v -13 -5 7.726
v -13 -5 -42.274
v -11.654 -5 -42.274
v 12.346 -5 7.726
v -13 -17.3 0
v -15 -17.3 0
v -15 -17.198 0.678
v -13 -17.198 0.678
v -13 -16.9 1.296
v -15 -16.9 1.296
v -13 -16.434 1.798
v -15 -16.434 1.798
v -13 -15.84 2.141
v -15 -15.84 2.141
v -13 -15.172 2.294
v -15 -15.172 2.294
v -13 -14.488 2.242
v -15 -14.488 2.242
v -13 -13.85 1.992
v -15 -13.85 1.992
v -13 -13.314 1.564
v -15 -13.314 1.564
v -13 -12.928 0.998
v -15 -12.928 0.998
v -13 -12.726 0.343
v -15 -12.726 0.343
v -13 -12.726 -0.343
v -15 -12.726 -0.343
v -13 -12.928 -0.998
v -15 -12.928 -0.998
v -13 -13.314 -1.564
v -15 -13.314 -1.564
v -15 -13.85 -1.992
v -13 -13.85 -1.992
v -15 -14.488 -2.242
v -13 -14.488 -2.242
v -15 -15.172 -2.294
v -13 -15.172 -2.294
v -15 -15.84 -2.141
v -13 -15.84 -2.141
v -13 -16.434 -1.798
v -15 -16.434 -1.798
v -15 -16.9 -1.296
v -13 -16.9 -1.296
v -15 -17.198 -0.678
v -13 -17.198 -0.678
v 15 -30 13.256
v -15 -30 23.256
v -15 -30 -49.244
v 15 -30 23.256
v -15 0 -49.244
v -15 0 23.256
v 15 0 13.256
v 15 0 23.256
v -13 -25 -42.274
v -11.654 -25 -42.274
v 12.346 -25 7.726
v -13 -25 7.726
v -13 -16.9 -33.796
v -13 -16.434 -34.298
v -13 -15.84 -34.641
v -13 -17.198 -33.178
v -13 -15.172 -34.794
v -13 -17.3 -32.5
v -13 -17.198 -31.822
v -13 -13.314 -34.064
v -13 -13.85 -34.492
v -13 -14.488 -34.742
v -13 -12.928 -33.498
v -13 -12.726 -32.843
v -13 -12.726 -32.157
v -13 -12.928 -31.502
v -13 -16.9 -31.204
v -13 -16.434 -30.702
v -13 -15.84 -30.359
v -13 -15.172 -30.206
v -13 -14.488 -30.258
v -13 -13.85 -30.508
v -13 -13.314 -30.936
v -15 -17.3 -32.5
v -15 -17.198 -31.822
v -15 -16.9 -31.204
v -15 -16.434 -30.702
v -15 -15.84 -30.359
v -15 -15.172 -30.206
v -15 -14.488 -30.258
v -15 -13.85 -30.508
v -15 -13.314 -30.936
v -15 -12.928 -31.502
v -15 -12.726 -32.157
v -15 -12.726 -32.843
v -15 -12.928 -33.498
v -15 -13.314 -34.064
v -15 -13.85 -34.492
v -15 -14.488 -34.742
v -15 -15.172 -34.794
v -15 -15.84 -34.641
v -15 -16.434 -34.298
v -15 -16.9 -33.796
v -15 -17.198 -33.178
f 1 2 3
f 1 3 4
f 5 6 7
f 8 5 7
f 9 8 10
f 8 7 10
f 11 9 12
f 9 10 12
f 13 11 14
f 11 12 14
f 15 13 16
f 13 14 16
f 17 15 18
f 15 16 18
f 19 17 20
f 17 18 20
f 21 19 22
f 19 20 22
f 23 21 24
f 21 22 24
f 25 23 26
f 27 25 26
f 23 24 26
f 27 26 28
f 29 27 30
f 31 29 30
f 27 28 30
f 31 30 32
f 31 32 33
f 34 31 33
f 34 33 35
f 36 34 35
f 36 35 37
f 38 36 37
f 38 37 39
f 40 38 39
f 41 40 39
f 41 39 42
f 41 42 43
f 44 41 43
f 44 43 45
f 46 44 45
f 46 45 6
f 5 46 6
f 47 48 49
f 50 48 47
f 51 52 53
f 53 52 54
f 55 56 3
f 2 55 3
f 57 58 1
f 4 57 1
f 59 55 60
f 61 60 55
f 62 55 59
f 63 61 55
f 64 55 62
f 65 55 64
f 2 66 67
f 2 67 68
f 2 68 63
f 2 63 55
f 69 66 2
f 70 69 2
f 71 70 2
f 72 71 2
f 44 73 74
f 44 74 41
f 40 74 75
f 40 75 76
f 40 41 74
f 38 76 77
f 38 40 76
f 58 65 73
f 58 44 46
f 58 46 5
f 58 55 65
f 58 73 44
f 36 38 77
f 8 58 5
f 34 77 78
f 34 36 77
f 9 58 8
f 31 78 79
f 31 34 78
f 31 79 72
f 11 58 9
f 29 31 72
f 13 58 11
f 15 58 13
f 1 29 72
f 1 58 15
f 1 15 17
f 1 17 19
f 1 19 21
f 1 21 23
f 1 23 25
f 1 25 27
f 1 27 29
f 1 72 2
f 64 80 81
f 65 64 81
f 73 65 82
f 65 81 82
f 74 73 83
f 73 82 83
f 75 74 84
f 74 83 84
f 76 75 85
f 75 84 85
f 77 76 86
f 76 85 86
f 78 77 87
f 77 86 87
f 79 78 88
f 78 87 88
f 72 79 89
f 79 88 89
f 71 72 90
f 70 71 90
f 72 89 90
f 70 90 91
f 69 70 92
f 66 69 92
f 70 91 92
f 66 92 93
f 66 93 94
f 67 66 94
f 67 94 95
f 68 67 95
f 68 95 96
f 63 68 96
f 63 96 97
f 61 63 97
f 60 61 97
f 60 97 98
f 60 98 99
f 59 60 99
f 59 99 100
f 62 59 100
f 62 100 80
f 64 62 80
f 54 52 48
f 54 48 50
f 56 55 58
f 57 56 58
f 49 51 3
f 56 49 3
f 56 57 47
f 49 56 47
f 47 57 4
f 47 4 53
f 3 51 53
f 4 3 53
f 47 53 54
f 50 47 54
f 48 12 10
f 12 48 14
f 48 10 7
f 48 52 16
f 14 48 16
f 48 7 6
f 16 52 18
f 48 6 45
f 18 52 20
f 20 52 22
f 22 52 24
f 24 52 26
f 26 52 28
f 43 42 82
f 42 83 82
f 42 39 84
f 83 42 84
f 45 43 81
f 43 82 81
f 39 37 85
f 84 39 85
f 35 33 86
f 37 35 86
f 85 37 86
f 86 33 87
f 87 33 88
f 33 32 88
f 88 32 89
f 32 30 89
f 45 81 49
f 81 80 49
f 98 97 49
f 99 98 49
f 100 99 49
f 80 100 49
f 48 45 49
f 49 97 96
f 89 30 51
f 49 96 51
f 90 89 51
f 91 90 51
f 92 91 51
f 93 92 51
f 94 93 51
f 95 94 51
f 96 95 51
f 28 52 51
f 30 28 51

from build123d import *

# Parameters (mm, degrees)
F0_W          = 30
F0_H          = 10
F1_DEPTH      = 30
F2_R          = 2.3
F3_DEPTH      = 30.001
F4_W          = 20
F4_H          = 50
F5_DEPTH      = 13
F5_DEPTH_BACK = 15.001


with BuildPart() as f1:
    # F0 (on Front) → F1 (new body)
    with BuildSketch(Plane.XZ):
        with Locations((0, 18.2561938465)):
            Rectangle(F0_W, F0_H)
        Polygon((15, 13.2561938465), (-15, 13.2561938465), (-15, -49.2438061535), align=None)
    extrude(amount=F1_DEPTH)

    # F2 (on face) → F3 (cut, through all)
    with BuildSketch(Plane(origin=(-15, 0, 0), x_dir=(0, -1, 0), z_dir=(-1, 0, 0))):
        with Locations((15, 0)):
            Circle(F2_R)
        with Locations((15, -32.5)):
            Circle(F2_R)
    extrude(amount=-F3_DEPTH, mode=Mode.SUBTRACT)

    # F4 (on Right) → F5 (cut, two sides)
    with BuildSketch(Plane.YZ) as f5_sk:
        with Locations((-15.0000003725, -17.2735065222)):
            Rectangle(F4_W, F4_H)
    extrude(amount=-F5_DEPTH, mode=Mode.SUBTRACT)
    extrude(f5_sk.sketch, amount=F5_DEPTH_BACK, mode=Mode.SUBTRACT)


solid = f1.part
